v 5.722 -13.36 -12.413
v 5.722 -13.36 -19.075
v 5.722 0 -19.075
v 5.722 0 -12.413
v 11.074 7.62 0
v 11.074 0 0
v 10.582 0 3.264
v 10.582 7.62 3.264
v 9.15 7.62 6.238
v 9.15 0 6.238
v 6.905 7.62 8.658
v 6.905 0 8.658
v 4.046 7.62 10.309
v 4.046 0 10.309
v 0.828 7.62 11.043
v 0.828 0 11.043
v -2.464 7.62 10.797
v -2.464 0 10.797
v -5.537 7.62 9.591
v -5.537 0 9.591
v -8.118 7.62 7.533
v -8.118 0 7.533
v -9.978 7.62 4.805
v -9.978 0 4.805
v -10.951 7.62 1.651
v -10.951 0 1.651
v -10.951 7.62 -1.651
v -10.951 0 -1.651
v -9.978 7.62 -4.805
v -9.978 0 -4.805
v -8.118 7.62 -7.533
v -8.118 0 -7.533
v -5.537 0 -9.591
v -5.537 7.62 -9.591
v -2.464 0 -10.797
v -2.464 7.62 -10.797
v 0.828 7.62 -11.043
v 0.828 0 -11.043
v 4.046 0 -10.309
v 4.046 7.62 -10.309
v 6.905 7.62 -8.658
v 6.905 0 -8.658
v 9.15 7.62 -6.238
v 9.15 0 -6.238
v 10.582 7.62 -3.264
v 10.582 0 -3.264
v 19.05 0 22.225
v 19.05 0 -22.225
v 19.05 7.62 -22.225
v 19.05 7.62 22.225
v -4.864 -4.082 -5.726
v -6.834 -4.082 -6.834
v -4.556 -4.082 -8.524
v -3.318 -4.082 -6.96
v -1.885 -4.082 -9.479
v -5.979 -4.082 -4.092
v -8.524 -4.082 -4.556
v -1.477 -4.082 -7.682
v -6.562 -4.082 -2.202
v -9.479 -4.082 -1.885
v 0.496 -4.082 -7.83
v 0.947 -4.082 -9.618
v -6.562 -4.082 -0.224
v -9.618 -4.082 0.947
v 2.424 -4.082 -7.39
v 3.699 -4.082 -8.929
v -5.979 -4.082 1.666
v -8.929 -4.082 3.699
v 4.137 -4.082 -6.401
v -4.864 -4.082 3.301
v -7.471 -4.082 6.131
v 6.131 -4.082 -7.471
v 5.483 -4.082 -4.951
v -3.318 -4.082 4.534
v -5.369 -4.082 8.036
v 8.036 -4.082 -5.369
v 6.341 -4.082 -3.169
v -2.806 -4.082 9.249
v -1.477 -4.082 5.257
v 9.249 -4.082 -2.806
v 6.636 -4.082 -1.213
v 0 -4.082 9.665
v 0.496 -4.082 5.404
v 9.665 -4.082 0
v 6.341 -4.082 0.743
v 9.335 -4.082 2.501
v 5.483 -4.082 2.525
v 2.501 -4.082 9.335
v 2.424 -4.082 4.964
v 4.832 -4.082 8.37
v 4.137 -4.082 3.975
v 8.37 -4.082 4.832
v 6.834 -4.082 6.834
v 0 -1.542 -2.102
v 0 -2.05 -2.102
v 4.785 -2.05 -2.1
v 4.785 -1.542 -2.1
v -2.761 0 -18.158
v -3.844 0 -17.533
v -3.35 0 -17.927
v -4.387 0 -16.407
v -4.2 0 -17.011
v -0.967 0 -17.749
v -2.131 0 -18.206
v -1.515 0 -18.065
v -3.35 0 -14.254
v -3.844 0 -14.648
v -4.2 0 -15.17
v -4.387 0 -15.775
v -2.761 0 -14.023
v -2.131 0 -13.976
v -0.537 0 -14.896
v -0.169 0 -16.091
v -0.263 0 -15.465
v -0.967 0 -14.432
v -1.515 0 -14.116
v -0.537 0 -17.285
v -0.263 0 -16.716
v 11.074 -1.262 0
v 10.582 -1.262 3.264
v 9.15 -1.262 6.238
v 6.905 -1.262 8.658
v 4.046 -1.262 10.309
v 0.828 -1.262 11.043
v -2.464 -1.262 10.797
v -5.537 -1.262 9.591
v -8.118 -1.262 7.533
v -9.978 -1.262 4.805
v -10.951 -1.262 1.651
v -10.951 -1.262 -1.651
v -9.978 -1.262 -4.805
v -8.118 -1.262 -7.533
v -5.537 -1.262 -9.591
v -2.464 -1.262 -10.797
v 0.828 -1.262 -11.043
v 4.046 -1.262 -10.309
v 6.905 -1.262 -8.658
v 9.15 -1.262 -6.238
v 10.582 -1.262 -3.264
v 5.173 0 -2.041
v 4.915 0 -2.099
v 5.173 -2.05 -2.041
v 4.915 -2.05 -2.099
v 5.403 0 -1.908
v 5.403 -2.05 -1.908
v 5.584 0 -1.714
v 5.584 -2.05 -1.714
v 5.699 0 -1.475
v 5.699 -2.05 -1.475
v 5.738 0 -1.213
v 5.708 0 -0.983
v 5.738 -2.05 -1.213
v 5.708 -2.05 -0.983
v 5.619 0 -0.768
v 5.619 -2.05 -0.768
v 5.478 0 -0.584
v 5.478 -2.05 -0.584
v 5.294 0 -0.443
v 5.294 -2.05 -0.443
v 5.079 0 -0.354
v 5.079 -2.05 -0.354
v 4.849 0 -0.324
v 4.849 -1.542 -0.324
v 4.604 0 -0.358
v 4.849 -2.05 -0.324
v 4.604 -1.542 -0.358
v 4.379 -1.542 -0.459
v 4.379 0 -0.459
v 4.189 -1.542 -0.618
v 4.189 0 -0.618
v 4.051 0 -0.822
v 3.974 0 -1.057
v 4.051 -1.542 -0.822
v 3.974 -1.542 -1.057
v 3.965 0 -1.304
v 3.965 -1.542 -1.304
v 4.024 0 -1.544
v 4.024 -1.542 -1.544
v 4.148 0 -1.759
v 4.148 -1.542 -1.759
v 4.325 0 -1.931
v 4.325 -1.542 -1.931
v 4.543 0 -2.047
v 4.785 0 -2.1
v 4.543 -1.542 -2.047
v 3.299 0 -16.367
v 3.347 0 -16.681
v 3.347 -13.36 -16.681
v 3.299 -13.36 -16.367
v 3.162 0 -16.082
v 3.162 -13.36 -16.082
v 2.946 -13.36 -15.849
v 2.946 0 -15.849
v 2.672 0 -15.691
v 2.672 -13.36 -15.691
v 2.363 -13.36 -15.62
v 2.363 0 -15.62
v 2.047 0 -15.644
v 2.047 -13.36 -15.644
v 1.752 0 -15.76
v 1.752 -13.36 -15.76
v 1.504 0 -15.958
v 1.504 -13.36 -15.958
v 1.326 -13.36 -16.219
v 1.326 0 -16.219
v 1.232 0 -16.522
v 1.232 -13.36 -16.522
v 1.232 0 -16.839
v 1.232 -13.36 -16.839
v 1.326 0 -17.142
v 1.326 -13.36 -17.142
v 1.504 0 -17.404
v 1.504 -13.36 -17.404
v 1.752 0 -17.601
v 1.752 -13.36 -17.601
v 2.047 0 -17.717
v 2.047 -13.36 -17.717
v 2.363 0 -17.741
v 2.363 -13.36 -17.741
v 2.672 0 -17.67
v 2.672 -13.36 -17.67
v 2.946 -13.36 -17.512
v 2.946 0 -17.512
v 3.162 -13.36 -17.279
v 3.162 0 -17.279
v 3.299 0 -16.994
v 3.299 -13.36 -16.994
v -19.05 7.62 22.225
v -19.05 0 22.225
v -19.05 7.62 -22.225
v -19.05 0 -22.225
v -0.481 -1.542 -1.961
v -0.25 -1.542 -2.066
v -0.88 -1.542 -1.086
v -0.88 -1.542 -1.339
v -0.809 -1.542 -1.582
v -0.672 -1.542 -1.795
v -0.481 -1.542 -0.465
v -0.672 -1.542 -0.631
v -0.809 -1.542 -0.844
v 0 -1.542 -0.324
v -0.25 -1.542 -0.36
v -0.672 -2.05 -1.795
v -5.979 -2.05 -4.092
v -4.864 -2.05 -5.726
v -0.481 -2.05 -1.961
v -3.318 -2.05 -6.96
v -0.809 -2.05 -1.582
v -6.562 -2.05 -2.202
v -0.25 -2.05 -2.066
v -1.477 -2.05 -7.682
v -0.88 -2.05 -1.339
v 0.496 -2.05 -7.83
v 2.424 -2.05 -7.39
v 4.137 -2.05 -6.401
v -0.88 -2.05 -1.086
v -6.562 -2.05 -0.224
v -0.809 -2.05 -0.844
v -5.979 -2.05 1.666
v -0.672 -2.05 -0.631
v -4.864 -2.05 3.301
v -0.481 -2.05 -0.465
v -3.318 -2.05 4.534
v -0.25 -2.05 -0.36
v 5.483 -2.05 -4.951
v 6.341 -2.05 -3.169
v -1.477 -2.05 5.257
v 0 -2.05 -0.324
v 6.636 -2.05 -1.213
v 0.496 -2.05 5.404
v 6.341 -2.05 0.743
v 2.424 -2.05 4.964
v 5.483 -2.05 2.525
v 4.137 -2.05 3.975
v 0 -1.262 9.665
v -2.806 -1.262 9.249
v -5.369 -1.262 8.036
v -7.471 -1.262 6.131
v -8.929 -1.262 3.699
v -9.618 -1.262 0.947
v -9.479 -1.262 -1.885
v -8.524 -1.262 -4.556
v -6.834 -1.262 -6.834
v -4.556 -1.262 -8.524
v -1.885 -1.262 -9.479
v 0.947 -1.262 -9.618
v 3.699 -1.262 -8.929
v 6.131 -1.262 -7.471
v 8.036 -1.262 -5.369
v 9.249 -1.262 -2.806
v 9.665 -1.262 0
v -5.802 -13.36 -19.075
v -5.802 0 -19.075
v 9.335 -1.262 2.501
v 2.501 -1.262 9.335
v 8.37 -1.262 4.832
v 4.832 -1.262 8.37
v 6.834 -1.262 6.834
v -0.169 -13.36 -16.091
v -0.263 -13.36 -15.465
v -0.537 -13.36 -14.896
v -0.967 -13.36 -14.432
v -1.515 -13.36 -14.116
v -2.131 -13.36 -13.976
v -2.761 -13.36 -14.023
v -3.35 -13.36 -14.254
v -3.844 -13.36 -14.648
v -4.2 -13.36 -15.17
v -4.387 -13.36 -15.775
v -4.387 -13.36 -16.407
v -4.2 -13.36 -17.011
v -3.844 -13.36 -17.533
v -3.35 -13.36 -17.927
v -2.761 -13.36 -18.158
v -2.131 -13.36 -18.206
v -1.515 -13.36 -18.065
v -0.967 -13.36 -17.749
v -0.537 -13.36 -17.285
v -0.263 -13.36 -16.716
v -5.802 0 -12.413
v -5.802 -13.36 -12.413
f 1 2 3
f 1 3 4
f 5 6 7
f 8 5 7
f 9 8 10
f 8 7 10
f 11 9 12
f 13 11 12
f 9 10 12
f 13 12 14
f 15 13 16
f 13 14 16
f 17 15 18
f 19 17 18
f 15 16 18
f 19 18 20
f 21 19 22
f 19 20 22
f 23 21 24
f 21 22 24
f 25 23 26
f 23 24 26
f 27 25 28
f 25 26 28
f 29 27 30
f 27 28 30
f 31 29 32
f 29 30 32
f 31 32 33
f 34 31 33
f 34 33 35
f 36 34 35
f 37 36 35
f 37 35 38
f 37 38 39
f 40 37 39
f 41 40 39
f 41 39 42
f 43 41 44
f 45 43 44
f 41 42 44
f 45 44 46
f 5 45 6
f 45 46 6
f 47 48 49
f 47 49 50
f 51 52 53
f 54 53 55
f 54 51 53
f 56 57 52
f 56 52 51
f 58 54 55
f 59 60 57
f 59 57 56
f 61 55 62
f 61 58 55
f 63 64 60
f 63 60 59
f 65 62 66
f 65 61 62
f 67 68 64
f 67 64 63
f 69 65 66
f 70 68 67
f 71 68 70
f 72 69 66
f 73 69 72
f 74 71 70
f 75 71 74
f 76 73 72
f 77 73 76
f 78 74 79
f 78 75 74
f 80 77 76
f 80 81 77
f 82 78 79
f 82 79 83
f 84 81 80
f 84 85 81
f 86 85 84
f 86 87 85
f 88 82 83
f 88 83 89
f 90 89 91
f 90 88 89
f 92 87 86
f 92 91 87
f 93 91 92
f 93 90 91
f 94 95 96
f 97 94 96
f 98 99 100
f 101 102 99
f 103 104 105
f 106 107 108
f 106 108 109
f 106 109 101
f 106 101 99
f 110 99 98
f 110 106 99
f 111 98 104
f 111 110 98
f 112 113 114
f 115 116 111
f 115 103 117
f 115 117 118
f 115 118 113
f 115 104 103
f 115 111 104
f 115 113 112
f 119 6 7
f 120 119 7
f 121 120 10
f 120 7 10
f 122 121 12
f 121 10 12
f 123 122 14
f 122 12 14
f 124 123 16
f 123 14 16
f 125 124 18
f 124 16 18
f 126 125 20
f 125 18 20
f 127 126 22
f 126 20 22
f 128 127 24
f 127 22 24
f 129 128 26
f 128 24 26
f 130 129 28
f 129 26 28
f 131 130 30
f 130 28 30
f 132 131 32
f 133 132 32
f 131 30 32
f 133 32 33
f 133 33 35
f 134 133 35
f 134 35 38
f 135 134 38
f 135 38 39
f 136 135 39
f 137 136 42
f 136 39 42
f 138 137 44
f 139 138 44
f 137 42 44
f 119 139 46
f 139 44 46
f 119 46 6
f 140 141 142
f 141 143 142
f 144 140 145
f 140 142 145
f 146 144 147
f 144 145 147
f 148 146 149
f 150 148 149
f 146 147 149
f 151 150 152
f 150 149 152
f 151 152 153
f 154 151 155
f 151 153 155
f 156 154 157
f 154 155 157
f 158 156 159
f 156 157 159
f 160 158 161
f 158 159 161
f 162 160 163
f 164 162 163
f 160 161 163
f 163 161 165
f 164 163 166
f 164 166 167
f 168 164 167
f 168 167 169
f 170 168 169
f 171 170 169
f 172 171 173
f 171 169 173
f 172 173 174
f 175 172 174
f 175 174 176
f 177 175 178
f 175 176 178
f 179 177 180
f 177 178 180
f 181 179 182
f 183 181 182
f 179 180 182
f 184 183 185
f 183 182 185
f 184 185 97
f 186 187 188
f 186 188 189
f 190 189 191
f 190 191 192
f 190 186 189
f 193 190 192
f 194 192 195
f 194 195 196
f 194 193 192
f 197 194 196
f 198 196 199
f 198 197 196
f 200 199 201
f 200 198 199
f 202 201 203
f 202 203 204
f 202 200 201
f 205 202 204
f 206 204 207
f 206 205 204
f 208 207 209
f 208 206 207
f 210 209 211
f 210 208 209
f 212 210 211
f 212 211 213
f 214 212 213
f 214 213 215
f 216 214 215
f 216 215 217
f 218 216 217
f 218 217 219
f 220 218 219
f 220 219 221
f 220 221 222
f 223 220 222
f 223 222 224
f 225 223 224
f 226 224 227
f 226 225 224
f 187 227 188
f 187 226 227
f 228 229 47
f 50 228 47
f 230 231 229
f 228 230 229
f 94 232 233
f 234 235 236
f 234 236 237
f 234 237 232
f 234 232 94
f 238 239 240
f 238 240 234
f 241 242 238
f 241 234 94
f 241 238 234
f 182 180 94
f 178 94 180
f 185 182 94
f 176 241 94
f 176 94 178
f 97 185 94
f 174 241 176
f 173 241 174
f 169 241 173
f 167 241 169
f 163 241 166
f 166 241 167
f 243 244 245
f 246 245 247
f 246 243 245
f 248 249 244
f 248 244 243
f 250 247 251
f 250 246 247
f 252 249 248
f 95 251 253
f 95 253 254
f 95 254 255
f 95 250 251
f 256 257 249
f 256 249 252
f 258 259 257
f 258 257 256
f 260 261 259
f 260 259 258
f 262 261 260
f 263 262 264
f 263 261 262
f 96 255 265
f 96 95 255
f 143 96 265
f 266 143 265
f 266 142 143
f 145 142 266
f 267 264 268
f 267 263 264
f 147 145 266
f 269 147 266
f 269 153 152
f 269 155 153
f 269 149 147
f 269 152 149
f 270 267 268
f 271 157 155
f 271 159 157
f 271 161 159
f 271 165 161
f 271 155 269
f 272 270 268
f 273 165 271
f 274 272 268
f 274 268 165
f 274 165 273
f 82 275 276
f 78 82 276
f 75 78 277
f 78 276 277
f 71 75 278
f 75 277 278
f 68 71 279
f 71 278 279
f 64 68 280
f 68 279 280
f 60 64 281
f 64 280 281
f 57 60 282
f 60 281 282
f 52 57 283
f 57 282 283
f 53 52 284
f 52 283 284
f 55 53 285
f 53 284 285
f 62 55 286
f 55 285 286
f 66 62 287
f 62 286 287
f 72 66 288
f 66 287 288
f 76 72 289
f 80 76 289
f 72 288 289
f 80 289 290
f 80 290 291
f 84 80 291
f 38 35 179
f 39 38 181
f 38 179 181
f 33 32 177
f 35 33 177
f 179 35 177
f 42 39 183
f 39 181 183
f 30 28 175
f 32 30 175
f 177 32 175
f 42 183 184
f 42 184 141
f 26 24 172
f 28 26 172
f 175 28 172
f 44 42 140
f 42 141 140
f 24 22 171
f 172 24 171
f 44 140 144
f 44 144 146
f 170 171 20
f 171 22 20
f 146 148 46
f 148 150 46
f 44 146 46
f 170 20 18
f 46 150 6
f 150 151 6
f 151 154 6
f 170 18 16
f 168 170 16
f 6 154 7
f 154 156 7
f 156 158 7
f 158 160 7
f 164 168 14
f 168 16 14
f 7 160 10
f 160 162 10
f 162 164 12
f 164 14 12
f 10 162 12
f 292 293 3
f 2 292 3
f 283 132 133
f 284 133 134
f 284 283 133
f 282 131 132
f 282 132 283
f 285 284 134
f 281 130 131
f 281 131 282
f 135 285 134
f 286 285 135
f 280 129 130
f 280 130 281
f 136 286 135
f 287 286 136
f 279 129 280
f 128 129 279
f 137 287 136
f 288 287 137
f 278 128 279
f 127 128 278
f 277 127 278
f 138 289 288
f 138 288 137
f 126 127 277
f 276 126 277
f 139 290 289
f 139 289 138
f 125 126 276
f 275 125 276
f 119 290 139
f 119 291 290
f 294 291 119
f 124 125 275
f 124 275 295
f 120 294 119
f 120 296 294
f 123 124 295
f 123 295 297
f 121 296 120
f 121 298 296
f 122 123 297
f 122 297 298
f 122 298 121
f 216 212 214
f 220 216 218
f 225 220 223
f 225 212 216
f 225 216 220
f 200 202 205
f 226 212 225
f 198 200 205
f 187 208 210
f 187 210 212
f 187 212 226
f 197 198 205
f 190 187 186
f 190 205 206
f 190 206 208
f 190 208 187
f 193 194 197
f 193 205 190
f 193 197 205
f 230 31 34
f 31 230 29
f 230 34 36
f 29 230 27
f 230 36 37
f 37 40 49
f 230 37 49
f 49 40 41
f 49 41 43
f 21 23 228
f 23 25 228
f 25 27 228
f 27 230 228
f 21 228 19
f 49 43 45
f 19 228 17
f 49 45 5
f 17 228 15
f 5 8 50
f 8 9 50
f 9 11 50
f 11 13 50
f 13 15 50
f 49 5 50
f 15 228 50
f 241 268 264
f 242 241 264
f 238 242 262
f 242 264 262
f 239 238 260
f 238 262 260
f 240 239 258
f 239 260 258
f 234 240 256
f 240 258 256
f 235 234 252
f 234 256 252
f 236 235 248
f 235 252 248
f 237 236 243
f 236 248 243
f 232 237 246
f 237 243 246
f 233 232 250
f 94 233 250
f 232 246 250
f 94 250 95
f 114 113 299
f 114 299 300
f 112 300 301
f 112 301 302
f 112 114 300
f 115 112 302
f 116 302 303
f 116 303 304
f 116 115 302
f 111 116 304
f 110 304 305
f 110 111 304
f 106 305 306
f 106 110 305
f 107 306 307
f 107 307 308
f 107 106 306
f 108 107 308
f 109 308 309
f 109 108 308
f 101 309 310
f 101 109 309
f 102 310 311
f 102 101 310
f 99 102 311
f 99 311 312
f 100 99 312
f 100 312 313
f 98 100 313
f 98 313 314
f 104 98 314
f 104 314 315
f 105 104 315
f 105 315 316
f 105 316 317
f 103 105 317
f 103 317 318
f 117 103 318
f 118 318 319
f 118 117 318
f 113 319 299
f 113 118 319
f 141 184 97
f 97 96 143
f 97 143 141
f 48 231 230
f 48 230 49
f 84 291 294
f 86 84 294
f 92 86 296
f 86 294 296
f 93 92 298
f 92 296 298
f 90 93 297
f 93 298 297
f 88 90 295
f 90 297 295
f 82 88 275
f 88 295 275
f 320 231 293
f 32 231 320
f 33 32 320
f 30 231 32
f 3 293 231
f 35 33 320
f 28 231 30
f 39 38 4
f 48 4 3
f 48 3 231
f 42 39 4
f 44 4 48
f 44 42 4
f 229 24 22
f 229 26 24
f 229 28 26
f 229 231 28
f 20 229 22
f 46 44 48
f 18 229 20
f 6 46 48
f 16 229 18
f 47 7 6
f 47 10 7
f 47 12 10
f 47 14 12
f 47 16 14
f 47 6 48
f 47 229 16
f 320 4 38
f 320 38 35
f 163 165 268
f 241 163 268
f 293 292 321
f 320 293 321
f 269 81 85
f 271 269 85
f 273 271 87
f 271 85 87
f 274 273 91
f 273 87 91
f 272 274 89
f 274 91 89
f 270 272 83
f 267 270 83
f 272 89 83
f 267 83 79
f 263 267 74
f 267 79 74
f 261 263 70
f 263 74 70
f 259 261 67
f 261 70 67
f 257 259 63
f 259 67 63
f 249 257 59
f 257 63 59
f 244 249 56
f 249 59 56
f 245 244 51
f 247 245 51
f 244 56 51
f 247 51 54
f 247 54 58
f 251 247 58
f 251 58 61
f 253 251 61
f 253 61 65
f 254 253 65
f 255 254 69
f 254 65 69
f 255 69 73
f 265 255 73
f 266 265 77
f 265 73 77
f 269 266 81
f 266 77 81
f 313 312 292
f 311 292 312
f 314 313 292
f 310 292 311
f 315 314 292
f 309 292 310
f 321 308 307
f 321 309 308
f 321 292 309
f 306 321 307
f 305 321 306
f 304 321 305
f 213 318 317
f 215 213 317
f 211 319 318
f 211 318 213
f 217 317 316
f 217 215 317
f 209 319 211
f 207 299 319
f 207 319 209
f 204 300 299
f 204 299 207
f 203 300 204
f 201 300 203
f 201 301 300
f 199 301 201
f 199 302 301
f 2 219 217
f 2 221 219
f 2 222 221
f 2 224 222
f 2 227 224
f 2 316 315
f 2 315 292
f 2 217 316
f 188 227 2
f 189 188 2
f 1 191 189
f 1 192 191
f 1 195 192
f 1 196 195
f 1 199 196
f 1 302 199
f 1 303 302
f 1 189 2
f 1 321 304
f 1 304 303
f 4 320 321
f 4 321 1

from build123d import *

# Parameters (mm, degrees)
F1_DEPTH  = 4.08178
F0_R      = 11.0744
F2_DEPTH  = 1.26238
F3_R      = 6.63575
F4_DEPTH  = 2.032
F6_DEPTH  = 0.508
F0_W      = 38.1
F0_H      = 44.45
F7_DEPTH  = 7.62
F9_DEPTH  = 27.94
F11_W     = 11.5240756422
F11_H     = 6.661596708
F11_R     = 2.1209
F11_R_2   = 1.0630985687
F12_DEPTH = 13.3604


# Not quite as in the source:
# - ends of sketch curves that miss each other by under 0.0002 mm in the source are joined


with BuildPart() as f1:
    # F0 (on Front) → F1 (new body)
    with BuildSketch(Plane.XZ):
        with BuildLine():
            ThreePointArc((0, 9.6647), (-6.8339749081, -6.8339749081), (9.6647, 0))
            ThreePointArc((9.6647, 0), (6.8339749081, 6.8339749081), (0, 9.6647))
        make_face()
        with BuildLine():
            ThreePointArc((6.63575, -1.21285), (-4.6921838233, -5.9050338233), (0, 5.4229))
            ThreePointArc((0, 5.4229), (4.6921838233, 3.4793338233), (6.63575, -1.21285))
        make_face(mode=Mode.SUBTRACT)
        with BuildLine():
            ThreePointArc((6.63575, -1.21285), (4.6921838233, 3.4793338233), (0, 5.4229))
            ThreePointArc((0, 5.4229), (-4.6921838233, -5.9050338233), (6.63575, -1.21285))
        make_face()
    extrude(amount=F1_DEPTH)

    # F0 (on Front) → F2 (join)
    with BuildSketch(Plane.XZ):
        Circle(F0_R)
        with BuildLine():
            ThreePointArc((0, 9.6647), (6.8339749081, 6.8339749081), (9.6647, 0))
            ThreePointArc((9.6647, 0), (-6.8339749081, -6.8339749081), (0, 9.6647))
        make_face(mode=Mode.SUBTRACT)
    extrude(amount=F2_DEPTH)

    # F3 (on face) → F4 (cut)
    with BuildSketch(Plane.XZ.offset(4.08178)):
        with Locations((0, -1.21285)):
            Circle(F3_R)
    extrude(amount=-F4_DEPTH, mode=Mode.SUBTRACT)

    # F5 (on face) → F6 (cut)
    with BuildSketch(Plane.XZ.offset(2.04978)):
        with BuildLine():
            ThreePointArc((4.8492713831, -0.32385), (4.2206534547, -0.5842320715), (3.9602713831, -1.21285))
            ThreePointArc((3.9602713831, -1.21285), (4.1982717908, -1.818259391), (4.7848395063, -2.0995120175))
            Line((4.7848395063, -2.0995120175), (4.9145697552, -2.0994486254))
            ThreePointArc((4.9145697552, -2.0994486254), (5.5005667281, -1.817941211), (5.7382713831, -1.21285))
            ThreePointArc((5.7382713831, -1.21285), (5.4778893116, -0.5842320715), (4.8492713831, -0.32385))
        make_face()
        with BuildLine():
            ThreePointArc((0, -0.32385), (0.6286179285, -0.5842320715), (0.889, -1.21285))
            Line((0.889, -1.21285), (3.9602713831, -1.21285))
            ThreePointArc((3.9602713831, -1.21285), (4.2206534547, -0.5842320715), (4.8492713831, -0.32385))
            Line((4.8492713831, -0.32385), (0, -0.32385))
        make_face()
        with BuildLine():
            Line((3.9602713831, -1.21285), (0.889, -1.21285))
            ThreePointArc((0.889, -1.21285), (0.6286179285, -0.5842320715), (0, -0.32385))
            ThreePointArc((0, -0.32385), (-0.889, -1.21285), (0, -2.10185))
            Line((0, -2.10185), (4.7848395063, -2.0995120175))
            ThreePointArc((4.7848395063, -2.0995120175), (4.1982717908, -1.818259391), (3.9602713831, -1.21285))
        make_face()
    extrude(amount=-F6_DEPTH, mode=Mode.SUBTRACT)

    # F8 (on face) → F9 (cut)
    with BuildSketch(Plane.XZ.offset(1.54178)):
        with BuildLine():
            Line((4.7848395063, -2.0995120175), (4.9145697552, -2.0994486254))
            ThreePointArc((4.9145697552, -2.0994486254), (5.5005667281, -1.817941211), (5.7382713831, -1.21285))
            ThreePointArc((5.7382713831, -1.21285), (5.4778893116, -0.5842320715), (4.8492713831, -0.32385))
            ThreePointArc((4.8492713831, -0.32385), (3.960856071, -1.1806128595), (4.7848395063, -2.0995120175))
        make_face()
    extrude(amount=-F9_DEPTH, mode=Mode.SUBTRACT)


with BuildPart() as f7:
    # F0 (on Front) → F7 (new body)
    with BuildSketch(Plane.XZ):
        Rectangle(F0_W, F0_H)
        Circle(F0_R, mode=Mode.SUBTRACT)
    extrude(amount=-F7_DEPTH)

    # F11 (on face) → F12 (join)
    with BuildSketch(Plane.XZ):
        with Locations((-0.0403500162, -15.7439657487)):
            Rectangle(F11_W, F11_H)
        with Locations((-2.289429307, -16.0906407982)):
            Circle(F11_R, mode=Mode.SUBTRACT)
        with Locations((2.2835119162, -16.6806168854)):
            Circle(F11_R_2, mode=Mode.SUBTRACT)
    extrude(amount=F12_DEPTH)


solid = Compound([f1.part, f7.part])
